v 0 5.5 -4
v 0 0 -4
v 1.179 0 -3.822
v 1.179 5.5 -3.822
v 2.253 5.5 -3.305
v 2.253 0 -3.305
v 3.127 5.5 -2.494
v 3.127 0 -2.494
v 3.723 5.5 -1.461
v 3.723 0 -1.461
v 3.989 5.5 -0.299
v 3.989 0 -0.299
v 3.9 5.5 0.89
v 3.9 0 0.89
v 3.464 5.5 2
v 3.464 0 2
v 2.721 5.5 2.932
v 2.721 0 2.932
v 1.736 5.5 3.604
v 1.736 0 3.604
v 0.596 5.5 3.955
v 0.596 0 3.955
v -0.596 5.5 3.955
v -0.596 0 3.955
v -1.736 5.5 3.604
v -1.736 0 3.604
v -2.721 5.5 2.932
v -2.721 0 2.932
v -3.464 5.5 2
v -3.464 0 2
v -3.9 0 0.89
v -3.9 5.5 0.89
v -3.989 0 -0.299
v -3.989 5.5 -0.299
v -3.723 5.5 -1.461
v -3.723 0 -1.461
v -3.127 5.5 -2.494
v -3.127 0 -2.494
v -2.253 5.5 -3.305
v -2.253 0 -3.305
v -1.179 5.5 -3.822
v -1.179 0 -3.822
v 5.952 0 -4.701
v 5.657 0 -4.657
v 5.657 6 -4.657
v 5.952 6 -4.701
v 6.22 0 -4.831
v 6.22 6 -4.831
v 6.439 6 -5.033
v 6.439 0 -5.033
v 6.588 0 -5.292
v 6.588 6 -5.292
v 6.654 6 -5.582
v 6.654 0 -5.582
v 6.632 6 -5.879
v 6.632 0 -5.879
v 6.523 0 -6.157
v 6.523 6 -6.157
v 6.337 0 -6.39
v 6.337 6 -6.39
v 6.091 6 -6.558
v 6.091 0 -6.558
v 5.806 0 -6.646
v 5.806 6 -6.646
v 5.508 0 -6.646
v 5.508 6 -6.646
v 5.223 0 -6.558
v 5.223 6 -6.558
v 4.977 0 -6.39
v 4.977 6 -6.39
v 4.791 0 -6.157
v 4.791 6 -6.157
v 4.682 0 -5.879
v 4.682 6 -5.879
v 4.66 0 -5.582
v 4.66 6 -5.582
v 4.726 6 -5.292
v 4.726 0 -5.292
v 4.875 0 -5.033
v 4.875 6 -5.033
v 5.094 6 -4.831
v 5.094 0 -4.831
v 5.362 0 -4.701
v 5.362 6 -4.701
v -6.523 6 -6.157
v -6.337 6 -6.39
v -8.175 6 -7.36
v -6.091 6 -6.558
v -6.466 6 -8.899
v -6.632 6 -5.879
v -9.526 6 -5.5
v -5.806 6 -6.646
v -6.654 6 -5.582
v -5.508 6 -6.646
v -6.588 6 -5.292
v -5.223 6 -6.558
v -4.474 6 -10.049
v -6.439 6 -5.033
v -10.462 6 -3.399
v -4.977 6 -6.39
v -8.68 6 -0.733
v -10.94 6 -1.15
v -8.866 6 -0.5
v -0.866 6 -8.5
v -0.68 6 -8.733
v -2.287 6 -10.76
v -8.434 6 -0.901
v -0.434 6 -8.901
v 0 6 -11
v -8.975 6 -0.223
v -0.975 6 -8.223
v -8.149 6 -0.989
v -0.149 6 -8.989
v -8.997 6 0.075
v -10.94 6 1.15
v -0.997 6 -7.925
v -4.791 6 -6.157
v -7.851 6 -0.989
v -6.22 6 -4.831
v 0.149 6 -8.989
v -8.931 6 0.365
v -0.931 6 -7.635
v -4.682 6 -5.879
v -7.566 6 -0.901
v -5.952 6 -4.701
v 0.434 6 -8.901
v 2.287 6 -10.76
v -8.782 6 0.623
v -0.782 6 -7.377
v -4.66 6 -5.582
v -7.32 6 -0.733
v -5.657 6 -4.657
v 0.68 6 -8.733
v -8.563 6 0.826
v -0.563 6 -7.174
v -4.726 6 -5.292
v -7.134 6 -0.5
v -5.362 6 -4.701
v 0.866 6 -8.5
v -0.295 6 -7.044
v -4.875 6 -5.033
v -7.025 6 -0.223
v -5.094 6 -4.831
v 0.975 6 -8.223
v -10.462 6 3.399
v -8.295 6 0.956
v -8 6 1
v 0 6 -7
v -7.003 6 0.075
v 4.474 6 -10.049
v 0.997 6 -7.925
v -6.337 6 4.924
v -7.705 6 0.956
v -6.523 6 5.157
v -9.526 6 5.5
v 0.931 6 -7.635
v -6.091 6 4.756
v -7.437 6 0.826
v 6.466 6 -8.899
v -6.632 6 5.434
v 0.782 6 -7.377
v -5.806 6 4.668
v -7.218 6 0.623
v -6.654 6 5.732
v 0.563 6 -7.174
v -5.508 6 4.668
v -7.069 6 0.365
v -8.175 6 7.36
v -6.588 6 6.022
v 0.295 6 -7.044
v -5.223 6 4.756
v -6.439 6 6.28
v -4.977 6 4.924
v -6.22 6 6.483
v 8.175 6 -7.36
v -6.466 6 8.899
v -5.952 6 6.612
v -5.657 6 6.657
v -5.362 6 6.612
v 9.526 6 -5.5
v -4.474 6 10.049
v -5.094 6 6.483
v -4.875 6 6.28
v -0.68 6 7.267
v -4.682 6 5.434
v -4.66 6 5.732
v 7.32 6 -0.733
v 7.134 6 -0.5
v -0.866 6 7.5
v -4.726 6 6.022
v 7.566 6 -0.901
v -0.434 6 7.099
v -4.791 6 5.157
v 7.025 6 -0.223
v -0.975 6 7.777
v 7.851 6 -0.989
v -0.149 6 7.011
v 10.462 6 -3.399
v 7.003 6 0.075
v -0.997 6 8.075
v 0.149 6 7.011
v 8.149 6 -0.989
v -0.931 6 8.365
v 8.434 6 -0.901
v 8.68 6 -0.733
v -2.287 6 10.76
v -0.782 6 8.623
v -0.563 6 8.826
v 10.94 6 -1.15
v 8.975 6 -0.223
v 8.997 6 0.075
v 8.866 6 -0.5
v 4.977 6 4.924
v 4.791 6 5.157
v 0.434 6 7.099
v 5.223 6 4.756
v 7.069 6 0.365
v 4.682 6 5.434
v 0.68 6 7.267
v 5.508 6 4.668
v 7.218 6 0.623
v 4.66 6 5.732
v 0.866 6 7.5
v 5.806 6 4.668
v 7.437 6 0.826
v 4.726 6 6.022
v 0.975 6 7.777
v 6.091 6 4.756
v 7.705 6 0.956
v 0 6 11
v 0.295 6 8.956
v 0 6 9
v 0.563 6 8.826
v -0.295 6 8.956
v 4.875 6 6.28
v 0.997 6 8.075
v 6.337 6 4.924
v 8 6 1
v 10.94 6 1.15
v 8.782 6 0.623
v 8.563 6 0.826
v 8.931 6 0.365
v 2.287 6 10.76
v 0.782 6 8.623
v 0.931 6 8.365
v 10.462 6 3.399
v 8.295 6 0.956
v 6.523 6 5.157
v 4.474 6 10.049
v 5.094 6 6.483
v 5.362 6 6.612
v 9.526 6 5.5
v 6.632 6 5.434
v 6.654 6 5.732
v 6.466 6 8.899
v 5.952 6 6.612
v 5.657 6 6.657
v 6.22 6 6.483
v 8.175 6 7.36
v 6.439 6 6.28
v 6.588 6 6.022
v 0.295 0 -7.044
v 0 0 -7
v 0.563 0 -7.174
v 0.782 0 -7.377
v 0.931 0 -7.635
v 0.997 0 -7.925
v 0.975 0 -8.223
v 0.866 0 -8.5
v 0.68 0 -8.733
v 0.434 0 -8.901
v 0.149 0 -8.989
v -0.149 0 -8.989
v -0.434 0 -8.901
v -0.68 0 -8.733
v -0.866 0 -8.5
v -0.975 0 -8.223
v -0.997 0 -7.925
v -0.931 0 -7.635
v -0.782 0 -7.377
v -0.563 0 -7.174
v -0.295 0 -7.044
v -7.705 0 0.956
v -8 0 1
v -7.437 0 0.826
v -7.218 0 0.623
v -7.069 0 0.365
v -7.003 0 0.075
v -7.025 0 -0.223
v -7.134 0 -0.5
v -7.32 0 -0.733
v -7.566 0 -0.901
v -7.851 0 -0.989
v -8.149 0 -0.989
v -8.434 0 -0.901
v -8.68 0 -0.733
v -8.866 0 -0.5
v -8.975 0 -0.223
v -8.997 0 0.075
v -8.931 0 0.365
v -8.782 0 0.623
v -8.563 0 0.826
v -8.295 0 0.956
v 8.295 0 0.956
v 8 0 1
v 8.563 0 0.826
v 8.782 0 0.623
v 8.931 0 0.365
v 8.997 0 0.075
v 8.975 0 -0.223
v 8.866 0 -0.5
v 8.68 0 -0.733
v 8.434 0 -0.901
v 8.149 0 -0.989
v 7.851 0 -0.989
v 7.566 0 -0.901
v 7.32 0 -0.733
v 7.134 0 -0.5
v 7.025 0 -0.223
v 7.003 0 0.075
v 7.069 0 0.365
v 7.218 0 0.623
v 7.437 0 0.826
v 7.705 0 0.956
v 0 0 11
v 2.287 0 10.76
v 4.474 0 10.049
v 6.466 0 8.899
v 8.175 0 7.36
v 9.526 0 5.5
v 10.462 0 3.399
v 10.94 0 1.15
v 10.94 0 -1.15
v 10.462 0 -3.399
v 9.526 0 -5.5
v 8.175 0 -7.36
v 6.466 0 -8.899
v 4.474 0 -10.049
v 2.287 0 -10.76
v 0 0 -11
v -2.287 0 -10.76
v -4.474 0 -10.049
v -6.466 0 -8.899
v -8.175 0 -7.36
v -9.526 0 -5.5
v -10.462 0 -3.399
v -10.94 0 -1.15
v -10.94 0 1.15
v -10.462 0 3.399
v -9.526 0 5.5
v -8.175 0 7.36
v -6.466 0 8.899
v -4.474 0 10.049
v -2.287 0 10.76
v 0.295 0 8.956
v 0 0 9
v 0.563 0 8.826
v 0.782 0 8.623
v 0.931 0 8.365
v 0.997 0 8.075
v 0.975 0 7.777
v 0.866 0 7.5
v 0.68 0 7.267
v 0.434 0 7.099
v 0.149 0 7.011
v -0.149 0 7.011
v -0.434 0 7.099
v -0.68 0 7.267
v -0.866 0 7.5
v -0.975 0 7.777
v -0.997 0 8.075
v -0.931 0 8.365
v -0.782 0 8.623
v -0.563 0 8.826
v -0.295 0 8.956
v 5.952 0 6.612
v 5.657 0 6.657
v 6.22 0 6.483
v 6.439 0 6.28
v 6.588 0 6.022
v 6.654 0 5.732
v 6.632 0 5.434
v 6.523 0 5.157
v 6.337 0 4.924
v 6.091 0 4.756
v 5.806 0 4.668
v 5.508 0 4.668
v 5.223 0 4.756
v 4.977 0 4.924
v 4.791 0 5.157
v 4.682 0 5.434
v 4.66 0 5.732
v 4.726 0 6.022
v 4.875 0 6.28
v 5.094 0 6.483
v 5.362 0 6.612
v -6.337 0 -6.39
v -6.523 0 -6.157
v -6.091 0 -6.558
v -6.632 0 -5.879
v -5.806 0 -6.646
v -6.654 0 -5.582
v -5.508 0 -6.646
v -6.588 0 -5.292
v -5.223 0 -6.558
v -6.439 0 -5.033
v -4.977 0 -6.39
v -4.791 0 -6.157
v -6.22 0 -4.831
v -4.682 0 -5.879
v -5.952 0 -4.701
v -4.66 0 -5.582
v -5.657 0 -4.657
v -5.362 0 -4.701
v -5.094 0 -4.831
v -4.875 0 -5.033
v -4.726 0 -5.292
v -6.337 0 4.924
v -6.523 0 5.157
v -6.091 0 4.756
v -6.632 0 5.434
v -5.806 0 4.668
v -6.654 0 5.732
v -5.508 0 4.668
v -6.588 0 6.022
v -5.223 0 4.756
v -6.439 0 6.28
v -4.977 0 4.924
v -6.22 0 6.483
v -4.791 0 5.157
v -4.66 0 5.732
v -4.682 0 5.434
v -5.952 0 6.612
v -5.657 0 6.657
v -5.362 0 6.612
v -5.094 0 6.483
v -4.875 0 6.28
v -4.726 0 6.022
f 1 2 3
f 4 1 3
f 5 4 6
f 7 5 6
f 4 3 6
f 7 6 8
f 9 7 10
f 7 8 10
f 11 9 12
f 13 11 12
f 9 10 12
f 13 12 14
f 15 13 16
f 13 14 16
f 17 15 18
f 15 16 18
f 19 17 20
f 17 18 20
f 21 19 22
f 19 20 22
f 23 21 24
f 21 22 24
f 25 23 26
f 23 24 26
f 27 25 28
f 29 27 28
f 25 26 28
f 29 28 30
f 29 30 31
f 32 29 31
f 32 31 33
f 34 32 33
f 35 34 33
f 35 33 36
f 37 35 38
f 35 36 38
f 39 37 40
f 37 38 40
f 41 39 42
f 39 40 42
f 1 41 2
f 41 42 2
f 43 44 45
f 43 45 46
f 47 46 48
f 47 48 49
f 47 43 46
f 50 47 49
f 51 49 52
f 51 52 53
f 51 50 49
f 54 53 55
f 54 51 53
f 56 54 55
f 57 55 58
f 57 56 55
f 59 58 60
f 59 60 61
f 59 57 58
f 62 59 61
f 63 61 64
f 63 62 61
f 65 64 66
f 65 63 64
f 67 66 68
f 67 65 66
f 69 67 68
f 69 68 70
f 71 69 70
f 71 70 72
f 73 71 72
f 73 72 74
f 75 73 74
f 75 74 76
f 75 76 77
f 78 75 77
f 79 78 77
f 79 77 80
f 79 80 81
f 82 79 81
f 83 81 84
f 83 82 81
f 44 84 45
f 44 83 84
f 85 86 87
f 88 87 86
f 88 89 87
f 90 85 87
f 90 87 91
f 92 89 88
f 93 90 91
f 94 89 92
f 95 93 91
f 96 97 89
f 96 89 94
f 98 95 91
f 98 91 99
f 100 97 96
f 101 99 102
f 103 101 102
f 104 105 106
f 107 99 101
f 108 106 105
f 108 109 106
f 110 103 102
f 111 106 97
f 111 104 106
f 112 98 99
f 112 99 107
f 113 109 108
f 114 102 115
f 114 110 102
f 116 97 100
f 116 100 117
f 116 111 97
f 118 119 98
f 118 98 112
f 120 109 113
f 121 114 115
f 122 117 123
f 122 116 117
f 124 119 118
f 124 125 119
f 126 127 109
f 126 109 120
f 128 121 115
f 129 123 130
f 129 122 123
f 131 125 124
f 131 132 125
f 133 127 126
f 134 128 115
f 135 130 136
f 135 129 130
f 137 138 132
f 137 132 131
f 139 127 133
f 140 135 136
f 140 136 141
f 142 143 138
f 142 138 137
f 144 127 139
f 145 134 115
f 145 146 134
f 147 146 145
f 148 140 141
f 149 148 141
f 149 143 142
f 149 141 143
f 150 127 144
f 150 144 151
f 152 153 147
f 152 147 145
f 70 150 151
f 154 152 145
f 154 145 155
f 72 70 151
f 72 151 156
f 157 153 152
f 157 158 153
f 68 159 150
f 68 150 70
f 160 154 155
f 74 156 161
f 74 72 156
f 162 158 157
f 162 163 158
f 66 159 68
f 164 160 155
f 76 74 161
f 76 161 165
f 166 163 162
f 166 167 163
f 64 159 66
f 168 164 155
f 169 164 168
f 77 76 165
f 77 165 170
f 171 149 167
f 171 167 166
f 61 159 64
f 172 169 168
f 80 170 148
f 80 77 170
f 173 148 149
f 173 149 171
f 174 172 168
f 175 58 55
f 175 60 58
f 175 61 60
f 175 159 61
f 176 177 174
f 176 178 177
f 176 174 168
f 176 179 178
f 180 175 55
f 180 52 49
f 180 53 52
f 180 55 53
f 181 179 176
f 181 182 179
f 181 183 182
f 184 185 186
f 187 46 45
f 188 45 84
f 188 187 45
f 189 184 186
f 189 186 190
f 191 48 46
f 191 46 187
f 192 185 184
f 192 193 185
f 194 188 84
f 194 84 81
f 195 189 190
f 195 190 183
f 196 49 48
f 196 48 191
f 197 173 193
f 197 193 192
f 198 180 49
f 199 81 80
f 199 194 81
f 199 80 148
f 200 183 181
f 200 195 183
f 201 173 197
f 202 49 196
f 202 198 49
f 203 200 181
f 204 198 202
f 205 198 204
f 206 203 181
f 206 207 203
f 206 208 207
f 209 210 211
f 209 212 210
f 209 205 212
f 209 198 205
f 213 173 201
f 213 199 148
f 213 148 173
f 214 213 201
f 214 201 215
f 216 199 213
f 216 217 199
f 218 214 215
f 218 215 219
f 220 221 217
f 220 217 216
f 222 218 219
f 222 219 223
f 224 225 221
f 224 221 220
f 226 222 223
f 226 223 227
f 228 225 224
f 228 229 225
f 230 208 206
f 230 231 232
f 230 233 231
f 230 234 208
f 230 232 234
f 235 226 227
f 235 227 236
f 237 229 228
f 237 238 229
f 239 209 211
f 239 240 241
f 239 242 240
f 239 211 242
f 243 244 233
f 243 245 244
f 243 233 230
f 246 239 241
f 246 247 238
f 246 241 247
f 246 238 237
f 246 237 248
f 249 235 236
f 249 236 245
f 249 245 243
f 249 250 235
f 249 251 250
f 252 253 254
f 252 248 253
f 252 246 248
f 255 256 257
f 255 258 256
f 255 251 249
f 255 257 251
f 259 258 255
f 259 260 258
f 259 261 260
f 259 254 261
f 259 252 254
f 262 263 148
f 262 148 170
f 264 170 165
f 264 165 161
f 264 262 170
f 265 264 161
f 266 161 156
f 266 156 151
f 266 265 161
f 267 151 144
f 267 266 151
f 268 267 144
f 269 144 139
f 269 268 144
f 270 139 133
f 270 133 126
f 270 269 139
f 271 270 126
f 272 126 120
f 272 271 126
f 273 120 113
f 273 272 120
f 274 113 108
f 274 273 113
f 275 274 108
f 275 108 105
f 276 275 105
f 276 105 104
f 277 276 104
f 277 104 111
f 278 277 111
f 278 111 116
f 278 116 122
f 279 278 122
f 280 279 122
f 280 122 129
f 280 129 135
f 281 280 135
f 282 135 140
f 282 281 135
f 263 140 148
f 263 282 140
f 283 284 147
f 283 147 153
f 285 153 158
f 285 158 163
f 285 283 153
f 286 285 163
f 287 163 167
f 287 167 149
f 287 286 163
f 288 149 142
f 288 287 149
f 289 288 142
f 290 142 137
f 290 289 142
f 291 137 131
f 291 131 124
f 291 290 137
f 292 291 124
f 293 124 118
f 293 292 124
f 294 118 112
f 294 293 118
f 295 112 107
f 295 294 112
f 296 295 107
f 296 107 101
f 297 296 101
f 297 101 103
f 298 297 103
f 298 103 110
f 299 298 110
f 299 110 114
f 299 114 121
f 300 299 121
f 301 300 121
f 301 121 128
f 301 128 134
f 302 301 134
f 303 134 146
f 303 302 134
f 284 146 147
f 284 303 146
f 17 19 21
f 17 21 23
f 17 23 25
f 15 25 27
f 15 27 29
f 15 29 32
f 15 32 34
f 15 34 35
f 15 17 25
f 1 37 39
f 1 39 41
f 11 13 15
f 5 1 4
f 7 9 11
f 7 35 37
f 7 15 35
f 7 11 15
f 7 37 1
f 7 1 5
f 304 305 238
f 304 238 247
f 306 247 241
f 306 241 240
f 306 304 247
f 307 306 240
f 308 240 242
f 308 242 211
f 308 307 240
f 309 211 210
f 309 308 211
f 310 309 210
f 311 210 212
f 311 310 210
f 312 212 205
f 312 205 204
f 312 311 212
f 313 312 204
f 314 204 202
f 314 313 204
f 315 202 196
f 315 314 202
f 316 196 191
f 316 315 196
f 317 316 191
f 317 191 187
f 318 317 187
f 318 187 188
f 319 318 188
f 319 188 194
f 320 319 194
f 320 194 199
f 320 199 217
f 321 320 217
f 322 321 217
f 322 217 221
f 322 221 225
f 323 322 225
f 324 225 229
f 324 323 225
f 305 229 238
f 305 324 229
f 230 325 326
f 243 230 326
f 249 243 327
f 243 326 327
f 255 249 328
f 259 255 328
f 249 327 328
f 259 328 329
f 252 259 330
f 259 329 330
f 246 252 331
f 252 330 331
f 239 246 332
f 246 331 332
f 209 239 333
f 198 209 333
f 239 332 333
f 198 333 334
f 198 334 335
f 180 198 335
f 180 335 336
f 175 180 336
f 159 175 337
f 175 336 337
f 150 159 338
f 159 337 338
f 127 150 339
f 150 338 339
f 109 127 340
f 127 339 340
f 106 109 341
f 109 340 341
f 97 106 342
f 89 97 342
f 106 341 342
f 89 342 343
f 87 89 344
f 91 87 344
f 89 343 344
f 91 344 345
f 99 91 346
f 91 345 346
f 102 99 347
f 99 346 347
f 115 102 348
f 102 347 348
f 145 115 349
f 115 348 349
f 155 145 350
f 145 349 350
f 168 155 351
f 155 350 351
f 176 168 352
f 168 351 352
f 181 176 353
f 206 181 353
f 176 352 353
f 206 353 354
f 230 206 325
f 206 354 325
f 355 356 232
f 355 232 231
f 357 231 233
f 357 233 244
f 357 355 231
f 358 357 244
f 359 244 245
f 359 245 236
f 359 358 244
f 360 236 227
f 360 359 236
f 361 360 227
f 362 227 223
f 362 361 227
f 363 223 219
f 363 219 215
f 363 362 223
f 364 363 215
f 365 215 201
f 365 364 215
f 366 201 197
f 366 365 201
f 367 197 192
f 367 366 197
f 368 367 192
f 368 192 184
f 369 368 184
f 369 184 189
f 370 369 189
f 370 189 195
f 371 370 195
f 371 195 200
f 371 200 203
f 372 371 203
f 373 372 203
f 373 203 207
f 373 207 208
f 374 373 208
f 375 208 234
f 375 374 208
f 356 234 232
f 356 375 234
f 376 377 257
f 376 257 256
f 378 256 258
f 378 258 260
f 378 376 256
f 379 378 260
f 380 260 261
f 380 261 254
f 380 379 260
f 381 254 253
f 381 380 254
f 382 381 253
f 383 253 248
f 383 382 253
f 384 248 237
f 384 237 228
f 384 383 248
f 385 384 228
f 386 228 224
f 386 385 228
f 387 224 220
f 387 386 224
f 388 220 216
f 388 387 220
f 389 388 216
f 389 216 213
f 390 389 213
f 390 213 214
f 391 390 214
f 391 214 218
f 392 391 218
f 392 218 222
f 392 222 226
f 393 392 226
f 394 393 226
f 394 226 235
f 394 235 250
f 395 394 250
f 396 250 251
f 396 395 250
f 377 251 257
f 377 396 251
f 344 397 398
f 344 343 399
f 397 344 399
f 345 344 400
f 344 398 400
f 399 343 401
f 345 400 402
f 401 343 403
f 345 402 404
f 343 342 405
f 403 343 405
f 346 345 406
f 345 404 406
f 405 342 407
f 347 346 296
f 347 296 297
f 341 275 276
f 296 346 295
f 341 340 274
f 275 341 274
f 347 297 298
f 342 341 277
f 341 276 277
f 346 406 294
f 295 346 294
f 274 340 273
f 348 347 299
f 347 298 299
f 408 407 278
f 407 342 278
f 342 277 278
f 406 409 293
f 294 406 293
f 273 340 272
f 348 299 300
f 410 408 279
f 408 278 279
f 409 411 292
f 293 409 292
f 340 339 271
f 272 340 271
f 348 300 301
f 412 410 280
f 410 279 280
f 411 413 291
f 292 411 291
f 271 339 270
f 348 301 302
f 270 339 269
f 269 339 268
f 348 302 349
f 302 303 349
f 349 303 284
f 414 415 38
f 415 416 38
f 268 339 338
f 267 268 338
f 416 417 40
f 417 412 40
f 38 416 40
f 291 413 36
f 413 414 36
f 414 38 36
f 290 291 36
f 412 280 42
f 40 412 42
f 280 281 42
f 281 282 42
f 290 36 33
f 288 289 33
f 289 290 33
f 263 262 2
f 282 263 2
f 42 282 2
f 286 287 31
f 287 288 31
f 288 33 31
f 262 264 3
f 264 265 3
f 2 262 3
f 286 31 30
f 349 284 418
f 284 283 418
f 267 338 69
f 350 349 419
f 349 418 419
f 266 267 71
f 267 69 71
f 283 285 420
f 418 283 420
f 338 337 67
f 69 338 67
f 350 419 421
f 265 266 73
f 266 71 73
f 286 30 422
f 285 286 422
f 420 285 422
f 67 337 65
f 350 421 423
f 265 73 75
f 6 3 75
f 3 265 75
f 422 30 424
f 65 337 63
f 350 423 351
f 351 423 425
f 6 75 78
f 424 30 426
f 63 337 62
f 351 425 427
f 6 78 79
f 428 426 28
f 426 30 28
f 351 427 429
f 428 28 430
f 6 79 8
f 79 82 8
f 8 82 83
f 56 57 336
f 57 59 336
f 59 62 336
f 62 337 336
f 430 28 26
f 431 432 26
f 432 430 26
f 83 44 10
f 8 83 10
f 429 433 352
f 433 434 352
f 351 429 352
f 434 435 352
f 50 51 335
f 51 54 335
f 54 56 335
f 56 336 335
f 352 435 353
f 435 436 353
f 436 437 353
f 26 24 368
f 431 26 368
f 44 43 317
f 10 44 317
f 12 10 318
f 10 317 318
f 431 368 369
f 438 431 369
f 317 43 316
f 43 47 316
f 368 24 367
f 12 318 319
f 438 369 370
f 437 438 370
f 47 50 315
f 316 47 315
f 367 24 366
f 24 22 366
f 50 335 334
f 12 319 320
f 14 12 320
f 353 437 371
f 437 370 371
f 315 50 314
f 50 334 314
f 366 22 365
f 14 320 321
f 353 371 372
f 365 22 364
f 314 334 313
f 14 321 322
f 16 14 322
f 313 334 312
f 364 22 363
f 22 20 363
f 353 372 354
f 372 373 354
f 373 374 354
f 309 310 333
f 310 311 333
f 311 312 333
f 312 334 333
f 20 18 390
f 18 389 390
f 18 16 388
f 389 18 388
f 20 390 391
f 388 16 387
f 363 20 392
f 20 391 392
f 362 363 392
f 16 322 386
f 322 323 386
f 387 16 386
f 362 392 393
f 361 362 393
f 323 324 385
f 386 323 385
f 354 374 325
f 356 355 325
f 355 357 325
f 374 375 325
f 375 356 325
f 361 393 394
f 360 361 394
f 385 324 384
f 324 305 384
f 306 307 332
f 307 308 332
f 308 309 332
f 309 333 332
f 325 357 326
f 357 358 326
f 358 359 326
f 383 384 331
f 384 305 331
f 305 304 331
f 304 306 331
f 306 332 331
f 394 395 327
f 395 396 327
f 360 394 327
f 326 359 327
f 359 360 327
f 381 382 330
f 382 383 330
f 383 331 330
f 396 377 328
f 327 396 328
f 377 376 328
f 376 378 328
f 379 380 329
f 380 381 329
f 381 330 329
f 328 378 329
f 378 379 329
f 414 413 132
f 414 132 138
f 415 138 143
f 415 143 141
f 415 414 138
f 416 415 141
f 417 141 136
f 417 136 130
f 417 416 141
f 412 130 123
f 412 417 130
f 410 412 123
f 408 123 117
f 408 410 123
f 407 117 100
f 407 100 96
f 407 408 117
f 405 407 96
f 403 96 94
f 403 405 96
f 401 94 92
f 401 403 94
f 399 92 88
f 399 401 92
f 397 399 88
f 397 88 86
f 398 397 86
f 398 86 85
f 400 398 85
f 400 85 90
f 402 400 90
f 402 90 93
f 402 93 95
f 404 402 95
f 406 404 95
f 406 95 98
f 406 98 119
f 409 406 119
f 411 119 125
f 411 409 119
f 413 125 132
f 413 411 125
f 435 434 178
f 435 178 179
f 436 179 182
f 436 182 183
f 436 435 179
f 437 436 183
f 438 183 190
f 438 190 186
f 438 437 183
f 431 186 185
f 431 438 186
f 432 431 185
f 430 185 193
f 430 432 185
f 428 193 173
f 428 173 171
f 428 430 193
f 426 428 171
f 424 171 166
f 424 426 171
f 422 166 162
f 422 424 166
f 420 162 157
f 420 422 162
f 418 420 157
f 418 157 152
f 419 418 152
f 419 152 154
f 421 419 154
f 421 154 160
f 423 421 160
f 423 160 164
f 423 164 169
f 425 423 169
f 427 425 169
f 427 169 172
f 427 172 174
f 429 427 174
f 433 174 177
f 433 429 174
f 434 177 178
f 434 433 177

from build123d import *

# Parameters (mm, degrees)
SKETCH1_R           = 11
SKETCH1_R_2         = 1
BOSS_EXTRUDE1_DEPTH = 6
SKETCH2_R           = 4
CUT_EXTRUDE1_DEPTH  = 5.5


with BuildPart() as part:
    # Sketch1 → Boss-Extrude1 (new body)
    with BuildSketch(Plane(origin=(0, 0, 0), x_dir=(1, 0, 0), z_dir=(0, 1, 0))):
        with Locations(Location((0, 0, 0), (0, 0, 270))):
            Circle(SKETCH1_R)
        with Locations(Location((0, 8, 0), (0, 0, 270))):
            Circle(SKETCH1_R_2, mode=Mode.SUBTRACT)
        with Locations(Location((5.656854249, 5.656854249, 0), (0, 0, 270))):
            Circle(SKETCH1_R_2, mode=Mode.SUBTRACT)
        with Locations(Location((8, 0, 0), (0, 0, 270))):
            Circle(SKETCH1_R_2, mode=Mode.SUBTRACT)
        with Locations(Location((5.656854249, -5.656854249, 0), (0, 0, 270))):
            Circle(SKETCH1_R_2, mode=Mode.SUBTRACT)
        with Locations(Location((0, -8, 0), (0, 0, 270))):
            Circle(SKETCH1_R_2, mode=Mode.SUBTRACT)
        with Locations(Location((-5.656854249, -5.656854249, 0), (0, 0, 270))):
            Circle(SKETCH1_R_2, mode=Mode.SUBTRACT)
        with Locations(Location((-8, 0, 0), (0, 0, 270))):
            Circle(SKETCH1_R_2, mode=Mode.SUBTRACT)
        with Locations(Location((-5.656854249, 5.656854249, 0), (0, 0, 270))):
            Circle(SKETCH1_R_2, mode=Mode.SUBTRACT)
    extrude(amount=BOSS_EXTRUDE1_DEPTH)

    # Sketch2 → Cut-Extrude1 (cut)
    with BuildSketch(Plane.XZ):
        with Locations(Location((0, 0, 0), (0, 0, 270))):
            Circle(SKETCH2_R)
    extrude(amount=-CUT_EXTRUDE1_DEPTH, mode=Mode.SUBTRACT)


solid = part.part
